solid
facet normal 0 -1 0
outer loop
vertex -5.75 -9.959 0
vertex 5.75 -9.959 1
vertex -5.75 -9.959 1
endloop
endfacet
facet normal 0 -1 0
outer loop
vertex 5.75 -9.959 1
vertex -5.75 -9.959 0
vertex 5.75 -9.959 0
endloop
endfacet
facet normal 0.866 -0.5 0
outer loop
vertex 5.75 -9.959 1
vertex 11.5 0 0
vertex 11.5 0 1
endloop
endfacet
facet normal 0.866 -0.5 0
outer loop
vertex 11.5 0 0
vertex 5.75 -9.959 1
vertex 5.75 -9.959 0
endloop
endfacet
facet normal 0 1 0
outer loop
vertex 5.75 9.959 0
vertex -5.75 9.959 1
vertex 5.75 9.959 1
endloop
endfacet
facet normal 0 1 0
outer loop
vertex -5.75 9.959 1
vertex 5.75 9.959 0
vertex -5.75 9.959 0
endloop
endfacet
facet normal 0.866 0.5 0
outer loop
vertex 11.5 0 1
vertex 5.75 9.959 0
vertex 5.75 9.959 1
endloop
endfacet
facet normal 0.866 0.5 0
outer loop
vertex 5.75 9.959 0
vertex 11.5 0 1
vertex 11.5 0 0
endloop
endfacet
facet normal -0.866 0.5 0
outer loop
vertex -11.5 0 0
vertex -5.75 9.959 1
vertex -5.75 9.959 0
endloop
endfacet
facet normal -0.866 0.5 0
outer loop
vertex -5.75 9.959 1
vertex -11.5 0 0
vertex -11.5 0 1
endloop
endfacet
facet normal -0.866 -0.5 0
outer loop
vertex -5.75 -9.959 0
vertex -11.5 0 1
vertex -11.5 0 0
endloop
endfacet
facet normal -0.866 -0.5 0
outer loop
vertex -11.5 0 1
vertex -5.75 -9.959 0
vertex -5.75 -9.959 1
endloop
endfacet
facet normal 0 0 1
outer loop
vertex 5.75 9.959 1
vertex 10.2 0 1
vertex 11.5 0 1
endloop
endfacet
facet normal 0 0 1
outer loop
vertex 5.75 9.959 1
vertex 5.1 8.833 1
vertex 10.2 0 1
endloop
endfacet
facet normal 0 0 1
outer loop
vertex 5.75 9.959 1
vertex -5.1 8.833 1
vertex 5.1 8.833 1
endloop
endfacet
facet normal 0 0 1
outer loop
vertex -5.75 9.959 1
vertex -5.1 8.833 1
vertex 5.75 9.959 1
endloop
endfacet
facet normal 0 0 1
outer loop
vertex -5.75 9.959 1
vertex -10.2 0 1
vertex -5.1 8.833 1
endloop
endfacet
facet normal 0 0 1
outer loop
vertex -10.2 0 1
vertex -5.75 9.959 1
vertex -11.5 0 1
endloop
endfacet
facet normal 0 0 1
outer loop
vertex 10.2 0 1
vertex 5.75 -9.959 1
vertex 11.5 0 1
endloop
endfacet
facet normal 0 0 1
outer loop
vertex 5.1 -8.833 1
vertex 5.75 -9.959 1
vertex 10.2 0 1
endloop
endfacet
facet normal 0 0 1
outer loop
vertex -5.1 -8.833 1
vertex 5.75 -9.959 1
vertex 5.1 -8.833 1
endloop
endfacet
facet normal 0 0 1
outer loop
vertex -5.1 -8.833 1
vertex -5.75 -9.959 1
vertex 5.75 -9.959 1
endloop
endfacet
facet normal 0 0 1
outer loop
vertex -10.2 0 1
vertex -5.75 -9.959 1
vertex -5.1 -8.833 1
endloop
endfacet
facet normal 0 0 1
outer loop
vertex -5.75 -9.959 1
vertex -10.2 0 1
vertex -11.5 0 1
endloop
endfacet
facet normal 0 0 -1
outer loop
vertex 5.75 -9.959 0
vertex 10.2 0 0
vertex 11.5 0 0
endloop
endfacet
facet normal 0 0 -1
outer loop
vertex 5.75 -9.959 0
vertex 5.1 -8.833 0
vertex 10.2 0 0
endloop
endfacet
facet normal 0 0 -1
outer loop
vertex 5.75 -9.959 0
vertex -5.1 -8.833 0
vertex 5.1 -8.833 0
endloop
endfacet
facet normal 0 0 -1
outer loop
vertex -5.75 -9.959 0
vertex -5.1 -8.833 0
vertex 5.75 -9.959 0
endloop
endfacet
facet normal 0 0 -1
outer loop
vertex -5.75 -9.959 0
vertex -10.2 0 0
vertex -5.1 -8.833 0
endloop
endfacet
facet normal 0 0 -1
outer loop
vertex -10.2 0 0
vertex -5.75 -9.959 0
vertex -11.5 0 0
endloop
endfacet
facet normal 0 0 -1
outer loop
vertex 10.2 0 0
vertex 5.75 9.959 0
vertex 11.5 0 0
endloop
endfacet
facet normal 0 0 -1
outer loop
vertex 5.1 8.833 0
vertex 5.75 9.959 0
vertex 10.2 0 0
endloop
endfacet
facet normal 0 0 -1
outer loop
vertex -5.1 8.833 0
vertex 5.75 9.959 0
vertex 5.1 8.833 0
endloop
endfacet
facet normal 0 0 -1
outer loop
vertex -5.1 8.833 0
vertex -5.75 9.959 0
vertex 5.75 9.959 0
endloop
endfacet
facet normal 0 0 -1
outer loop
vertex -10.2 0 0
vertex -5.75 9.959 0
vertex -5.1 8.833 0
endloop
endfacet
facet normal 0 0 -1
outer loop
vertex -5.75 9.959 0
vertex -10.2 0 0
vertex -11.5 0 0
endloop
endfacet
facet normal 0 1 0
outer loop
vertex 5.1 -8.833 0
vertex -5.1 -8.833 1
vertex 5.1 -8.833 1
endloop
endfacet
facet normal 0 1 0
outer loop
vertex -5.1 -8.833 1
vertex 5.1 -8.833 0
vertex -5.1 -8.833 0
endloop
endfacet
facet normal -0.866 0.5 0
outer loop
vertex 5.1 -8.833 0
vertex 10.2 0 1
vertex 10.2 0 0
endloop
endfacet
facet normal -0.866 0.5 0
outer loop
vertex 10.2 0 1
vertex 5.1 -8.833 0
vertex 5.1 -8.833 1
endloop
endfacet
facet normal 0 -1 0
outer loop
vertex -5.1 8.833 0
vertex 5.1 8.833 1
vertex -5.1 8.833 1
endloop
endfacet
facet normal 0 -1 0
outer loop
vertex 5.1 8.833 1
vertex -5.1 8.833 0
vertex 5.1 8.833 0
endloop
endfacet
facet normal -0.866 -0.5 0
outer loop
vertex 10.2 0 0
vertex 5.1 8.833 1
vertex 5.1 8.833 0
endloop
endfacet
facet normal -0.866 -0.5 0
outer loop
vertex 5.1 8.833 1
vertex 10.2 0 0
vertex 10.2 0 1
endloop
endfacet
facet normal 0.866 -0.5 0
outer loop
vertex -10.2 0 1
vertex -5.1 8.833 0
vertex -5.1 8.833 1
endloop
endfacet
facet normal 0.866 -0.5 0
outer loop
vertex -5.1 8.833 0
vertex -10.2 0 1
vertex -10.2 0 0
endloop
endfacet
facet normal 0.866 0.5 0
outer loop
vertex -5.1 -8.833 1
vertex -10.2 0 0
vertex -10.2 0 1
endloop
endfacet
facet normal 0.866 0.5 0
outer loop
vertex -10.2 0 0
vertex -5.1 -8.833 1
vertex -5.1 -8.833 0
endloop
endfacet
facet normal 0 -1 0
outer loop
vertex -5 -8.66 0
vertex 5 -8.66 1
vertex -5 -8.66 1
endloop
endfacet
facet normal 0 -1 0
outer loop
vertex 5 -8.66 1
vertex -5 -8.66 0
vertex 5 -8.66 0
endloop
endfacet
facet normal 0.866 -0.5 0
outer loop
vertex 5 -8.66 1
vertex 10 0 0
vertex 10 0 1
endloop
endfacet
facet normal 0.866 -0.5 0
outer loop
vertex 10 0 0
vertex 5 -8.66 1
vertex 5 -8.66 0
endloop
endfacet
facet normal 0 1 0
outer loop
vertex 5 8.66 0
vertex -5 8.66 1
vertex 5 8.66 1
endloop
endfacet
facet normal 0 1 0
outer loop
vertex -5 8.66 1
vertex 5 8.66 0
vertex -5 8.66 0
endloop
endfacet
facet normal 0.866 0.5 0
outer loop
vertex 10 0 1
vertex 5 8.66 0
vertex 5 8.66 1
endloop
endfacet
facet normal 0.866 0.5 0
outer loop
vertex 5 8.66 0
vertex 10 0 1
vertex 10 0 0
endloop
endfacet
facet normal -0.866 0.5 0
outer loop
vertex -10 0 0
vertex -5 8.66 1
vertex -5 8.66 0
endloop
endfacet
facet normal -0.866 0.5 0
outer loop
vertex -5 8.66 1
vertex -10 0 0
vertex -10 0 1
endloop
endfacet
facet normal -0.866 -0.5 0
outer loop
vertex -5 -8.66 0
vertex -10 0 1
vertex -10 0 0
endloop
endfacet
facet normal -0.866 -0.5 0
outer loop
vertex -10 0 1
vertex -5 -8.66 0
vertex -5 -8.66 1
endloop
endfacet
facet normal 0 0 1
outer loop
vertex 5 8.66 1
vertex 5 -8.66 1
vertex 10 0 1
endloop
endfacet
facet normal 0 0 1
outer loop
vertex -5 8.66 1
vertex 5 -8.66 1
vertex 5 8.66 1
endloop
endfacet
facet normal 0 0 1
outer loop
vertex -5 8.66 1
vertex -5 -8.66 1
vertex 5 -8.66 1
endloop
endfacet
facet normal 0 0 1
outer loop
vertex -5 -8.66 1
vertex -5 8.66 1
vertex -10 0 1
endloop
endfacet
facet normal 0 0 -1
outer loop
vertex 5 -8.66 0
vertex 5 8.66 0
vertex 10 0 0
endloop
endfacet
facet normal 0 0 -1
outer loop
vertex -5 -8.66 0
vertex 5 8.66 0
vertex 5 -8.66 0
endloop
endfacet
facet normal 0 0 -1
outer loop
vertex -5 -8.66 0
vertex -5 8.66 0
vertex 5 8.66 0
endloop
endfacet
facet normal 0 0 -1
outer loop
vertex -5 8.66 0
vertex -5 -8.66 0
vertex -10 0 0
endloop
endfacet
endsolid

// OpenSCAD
gap = 0.2;
rim_width = 1.3;
$fn = 6;

cylinder(h=1, r=10);

difference() {
	cylinder(h=1, r=10 + gap + rim_width);
	translate([0, 0, -1]) {
		cylinder(h=3, r=10 + gap);
	}
}
